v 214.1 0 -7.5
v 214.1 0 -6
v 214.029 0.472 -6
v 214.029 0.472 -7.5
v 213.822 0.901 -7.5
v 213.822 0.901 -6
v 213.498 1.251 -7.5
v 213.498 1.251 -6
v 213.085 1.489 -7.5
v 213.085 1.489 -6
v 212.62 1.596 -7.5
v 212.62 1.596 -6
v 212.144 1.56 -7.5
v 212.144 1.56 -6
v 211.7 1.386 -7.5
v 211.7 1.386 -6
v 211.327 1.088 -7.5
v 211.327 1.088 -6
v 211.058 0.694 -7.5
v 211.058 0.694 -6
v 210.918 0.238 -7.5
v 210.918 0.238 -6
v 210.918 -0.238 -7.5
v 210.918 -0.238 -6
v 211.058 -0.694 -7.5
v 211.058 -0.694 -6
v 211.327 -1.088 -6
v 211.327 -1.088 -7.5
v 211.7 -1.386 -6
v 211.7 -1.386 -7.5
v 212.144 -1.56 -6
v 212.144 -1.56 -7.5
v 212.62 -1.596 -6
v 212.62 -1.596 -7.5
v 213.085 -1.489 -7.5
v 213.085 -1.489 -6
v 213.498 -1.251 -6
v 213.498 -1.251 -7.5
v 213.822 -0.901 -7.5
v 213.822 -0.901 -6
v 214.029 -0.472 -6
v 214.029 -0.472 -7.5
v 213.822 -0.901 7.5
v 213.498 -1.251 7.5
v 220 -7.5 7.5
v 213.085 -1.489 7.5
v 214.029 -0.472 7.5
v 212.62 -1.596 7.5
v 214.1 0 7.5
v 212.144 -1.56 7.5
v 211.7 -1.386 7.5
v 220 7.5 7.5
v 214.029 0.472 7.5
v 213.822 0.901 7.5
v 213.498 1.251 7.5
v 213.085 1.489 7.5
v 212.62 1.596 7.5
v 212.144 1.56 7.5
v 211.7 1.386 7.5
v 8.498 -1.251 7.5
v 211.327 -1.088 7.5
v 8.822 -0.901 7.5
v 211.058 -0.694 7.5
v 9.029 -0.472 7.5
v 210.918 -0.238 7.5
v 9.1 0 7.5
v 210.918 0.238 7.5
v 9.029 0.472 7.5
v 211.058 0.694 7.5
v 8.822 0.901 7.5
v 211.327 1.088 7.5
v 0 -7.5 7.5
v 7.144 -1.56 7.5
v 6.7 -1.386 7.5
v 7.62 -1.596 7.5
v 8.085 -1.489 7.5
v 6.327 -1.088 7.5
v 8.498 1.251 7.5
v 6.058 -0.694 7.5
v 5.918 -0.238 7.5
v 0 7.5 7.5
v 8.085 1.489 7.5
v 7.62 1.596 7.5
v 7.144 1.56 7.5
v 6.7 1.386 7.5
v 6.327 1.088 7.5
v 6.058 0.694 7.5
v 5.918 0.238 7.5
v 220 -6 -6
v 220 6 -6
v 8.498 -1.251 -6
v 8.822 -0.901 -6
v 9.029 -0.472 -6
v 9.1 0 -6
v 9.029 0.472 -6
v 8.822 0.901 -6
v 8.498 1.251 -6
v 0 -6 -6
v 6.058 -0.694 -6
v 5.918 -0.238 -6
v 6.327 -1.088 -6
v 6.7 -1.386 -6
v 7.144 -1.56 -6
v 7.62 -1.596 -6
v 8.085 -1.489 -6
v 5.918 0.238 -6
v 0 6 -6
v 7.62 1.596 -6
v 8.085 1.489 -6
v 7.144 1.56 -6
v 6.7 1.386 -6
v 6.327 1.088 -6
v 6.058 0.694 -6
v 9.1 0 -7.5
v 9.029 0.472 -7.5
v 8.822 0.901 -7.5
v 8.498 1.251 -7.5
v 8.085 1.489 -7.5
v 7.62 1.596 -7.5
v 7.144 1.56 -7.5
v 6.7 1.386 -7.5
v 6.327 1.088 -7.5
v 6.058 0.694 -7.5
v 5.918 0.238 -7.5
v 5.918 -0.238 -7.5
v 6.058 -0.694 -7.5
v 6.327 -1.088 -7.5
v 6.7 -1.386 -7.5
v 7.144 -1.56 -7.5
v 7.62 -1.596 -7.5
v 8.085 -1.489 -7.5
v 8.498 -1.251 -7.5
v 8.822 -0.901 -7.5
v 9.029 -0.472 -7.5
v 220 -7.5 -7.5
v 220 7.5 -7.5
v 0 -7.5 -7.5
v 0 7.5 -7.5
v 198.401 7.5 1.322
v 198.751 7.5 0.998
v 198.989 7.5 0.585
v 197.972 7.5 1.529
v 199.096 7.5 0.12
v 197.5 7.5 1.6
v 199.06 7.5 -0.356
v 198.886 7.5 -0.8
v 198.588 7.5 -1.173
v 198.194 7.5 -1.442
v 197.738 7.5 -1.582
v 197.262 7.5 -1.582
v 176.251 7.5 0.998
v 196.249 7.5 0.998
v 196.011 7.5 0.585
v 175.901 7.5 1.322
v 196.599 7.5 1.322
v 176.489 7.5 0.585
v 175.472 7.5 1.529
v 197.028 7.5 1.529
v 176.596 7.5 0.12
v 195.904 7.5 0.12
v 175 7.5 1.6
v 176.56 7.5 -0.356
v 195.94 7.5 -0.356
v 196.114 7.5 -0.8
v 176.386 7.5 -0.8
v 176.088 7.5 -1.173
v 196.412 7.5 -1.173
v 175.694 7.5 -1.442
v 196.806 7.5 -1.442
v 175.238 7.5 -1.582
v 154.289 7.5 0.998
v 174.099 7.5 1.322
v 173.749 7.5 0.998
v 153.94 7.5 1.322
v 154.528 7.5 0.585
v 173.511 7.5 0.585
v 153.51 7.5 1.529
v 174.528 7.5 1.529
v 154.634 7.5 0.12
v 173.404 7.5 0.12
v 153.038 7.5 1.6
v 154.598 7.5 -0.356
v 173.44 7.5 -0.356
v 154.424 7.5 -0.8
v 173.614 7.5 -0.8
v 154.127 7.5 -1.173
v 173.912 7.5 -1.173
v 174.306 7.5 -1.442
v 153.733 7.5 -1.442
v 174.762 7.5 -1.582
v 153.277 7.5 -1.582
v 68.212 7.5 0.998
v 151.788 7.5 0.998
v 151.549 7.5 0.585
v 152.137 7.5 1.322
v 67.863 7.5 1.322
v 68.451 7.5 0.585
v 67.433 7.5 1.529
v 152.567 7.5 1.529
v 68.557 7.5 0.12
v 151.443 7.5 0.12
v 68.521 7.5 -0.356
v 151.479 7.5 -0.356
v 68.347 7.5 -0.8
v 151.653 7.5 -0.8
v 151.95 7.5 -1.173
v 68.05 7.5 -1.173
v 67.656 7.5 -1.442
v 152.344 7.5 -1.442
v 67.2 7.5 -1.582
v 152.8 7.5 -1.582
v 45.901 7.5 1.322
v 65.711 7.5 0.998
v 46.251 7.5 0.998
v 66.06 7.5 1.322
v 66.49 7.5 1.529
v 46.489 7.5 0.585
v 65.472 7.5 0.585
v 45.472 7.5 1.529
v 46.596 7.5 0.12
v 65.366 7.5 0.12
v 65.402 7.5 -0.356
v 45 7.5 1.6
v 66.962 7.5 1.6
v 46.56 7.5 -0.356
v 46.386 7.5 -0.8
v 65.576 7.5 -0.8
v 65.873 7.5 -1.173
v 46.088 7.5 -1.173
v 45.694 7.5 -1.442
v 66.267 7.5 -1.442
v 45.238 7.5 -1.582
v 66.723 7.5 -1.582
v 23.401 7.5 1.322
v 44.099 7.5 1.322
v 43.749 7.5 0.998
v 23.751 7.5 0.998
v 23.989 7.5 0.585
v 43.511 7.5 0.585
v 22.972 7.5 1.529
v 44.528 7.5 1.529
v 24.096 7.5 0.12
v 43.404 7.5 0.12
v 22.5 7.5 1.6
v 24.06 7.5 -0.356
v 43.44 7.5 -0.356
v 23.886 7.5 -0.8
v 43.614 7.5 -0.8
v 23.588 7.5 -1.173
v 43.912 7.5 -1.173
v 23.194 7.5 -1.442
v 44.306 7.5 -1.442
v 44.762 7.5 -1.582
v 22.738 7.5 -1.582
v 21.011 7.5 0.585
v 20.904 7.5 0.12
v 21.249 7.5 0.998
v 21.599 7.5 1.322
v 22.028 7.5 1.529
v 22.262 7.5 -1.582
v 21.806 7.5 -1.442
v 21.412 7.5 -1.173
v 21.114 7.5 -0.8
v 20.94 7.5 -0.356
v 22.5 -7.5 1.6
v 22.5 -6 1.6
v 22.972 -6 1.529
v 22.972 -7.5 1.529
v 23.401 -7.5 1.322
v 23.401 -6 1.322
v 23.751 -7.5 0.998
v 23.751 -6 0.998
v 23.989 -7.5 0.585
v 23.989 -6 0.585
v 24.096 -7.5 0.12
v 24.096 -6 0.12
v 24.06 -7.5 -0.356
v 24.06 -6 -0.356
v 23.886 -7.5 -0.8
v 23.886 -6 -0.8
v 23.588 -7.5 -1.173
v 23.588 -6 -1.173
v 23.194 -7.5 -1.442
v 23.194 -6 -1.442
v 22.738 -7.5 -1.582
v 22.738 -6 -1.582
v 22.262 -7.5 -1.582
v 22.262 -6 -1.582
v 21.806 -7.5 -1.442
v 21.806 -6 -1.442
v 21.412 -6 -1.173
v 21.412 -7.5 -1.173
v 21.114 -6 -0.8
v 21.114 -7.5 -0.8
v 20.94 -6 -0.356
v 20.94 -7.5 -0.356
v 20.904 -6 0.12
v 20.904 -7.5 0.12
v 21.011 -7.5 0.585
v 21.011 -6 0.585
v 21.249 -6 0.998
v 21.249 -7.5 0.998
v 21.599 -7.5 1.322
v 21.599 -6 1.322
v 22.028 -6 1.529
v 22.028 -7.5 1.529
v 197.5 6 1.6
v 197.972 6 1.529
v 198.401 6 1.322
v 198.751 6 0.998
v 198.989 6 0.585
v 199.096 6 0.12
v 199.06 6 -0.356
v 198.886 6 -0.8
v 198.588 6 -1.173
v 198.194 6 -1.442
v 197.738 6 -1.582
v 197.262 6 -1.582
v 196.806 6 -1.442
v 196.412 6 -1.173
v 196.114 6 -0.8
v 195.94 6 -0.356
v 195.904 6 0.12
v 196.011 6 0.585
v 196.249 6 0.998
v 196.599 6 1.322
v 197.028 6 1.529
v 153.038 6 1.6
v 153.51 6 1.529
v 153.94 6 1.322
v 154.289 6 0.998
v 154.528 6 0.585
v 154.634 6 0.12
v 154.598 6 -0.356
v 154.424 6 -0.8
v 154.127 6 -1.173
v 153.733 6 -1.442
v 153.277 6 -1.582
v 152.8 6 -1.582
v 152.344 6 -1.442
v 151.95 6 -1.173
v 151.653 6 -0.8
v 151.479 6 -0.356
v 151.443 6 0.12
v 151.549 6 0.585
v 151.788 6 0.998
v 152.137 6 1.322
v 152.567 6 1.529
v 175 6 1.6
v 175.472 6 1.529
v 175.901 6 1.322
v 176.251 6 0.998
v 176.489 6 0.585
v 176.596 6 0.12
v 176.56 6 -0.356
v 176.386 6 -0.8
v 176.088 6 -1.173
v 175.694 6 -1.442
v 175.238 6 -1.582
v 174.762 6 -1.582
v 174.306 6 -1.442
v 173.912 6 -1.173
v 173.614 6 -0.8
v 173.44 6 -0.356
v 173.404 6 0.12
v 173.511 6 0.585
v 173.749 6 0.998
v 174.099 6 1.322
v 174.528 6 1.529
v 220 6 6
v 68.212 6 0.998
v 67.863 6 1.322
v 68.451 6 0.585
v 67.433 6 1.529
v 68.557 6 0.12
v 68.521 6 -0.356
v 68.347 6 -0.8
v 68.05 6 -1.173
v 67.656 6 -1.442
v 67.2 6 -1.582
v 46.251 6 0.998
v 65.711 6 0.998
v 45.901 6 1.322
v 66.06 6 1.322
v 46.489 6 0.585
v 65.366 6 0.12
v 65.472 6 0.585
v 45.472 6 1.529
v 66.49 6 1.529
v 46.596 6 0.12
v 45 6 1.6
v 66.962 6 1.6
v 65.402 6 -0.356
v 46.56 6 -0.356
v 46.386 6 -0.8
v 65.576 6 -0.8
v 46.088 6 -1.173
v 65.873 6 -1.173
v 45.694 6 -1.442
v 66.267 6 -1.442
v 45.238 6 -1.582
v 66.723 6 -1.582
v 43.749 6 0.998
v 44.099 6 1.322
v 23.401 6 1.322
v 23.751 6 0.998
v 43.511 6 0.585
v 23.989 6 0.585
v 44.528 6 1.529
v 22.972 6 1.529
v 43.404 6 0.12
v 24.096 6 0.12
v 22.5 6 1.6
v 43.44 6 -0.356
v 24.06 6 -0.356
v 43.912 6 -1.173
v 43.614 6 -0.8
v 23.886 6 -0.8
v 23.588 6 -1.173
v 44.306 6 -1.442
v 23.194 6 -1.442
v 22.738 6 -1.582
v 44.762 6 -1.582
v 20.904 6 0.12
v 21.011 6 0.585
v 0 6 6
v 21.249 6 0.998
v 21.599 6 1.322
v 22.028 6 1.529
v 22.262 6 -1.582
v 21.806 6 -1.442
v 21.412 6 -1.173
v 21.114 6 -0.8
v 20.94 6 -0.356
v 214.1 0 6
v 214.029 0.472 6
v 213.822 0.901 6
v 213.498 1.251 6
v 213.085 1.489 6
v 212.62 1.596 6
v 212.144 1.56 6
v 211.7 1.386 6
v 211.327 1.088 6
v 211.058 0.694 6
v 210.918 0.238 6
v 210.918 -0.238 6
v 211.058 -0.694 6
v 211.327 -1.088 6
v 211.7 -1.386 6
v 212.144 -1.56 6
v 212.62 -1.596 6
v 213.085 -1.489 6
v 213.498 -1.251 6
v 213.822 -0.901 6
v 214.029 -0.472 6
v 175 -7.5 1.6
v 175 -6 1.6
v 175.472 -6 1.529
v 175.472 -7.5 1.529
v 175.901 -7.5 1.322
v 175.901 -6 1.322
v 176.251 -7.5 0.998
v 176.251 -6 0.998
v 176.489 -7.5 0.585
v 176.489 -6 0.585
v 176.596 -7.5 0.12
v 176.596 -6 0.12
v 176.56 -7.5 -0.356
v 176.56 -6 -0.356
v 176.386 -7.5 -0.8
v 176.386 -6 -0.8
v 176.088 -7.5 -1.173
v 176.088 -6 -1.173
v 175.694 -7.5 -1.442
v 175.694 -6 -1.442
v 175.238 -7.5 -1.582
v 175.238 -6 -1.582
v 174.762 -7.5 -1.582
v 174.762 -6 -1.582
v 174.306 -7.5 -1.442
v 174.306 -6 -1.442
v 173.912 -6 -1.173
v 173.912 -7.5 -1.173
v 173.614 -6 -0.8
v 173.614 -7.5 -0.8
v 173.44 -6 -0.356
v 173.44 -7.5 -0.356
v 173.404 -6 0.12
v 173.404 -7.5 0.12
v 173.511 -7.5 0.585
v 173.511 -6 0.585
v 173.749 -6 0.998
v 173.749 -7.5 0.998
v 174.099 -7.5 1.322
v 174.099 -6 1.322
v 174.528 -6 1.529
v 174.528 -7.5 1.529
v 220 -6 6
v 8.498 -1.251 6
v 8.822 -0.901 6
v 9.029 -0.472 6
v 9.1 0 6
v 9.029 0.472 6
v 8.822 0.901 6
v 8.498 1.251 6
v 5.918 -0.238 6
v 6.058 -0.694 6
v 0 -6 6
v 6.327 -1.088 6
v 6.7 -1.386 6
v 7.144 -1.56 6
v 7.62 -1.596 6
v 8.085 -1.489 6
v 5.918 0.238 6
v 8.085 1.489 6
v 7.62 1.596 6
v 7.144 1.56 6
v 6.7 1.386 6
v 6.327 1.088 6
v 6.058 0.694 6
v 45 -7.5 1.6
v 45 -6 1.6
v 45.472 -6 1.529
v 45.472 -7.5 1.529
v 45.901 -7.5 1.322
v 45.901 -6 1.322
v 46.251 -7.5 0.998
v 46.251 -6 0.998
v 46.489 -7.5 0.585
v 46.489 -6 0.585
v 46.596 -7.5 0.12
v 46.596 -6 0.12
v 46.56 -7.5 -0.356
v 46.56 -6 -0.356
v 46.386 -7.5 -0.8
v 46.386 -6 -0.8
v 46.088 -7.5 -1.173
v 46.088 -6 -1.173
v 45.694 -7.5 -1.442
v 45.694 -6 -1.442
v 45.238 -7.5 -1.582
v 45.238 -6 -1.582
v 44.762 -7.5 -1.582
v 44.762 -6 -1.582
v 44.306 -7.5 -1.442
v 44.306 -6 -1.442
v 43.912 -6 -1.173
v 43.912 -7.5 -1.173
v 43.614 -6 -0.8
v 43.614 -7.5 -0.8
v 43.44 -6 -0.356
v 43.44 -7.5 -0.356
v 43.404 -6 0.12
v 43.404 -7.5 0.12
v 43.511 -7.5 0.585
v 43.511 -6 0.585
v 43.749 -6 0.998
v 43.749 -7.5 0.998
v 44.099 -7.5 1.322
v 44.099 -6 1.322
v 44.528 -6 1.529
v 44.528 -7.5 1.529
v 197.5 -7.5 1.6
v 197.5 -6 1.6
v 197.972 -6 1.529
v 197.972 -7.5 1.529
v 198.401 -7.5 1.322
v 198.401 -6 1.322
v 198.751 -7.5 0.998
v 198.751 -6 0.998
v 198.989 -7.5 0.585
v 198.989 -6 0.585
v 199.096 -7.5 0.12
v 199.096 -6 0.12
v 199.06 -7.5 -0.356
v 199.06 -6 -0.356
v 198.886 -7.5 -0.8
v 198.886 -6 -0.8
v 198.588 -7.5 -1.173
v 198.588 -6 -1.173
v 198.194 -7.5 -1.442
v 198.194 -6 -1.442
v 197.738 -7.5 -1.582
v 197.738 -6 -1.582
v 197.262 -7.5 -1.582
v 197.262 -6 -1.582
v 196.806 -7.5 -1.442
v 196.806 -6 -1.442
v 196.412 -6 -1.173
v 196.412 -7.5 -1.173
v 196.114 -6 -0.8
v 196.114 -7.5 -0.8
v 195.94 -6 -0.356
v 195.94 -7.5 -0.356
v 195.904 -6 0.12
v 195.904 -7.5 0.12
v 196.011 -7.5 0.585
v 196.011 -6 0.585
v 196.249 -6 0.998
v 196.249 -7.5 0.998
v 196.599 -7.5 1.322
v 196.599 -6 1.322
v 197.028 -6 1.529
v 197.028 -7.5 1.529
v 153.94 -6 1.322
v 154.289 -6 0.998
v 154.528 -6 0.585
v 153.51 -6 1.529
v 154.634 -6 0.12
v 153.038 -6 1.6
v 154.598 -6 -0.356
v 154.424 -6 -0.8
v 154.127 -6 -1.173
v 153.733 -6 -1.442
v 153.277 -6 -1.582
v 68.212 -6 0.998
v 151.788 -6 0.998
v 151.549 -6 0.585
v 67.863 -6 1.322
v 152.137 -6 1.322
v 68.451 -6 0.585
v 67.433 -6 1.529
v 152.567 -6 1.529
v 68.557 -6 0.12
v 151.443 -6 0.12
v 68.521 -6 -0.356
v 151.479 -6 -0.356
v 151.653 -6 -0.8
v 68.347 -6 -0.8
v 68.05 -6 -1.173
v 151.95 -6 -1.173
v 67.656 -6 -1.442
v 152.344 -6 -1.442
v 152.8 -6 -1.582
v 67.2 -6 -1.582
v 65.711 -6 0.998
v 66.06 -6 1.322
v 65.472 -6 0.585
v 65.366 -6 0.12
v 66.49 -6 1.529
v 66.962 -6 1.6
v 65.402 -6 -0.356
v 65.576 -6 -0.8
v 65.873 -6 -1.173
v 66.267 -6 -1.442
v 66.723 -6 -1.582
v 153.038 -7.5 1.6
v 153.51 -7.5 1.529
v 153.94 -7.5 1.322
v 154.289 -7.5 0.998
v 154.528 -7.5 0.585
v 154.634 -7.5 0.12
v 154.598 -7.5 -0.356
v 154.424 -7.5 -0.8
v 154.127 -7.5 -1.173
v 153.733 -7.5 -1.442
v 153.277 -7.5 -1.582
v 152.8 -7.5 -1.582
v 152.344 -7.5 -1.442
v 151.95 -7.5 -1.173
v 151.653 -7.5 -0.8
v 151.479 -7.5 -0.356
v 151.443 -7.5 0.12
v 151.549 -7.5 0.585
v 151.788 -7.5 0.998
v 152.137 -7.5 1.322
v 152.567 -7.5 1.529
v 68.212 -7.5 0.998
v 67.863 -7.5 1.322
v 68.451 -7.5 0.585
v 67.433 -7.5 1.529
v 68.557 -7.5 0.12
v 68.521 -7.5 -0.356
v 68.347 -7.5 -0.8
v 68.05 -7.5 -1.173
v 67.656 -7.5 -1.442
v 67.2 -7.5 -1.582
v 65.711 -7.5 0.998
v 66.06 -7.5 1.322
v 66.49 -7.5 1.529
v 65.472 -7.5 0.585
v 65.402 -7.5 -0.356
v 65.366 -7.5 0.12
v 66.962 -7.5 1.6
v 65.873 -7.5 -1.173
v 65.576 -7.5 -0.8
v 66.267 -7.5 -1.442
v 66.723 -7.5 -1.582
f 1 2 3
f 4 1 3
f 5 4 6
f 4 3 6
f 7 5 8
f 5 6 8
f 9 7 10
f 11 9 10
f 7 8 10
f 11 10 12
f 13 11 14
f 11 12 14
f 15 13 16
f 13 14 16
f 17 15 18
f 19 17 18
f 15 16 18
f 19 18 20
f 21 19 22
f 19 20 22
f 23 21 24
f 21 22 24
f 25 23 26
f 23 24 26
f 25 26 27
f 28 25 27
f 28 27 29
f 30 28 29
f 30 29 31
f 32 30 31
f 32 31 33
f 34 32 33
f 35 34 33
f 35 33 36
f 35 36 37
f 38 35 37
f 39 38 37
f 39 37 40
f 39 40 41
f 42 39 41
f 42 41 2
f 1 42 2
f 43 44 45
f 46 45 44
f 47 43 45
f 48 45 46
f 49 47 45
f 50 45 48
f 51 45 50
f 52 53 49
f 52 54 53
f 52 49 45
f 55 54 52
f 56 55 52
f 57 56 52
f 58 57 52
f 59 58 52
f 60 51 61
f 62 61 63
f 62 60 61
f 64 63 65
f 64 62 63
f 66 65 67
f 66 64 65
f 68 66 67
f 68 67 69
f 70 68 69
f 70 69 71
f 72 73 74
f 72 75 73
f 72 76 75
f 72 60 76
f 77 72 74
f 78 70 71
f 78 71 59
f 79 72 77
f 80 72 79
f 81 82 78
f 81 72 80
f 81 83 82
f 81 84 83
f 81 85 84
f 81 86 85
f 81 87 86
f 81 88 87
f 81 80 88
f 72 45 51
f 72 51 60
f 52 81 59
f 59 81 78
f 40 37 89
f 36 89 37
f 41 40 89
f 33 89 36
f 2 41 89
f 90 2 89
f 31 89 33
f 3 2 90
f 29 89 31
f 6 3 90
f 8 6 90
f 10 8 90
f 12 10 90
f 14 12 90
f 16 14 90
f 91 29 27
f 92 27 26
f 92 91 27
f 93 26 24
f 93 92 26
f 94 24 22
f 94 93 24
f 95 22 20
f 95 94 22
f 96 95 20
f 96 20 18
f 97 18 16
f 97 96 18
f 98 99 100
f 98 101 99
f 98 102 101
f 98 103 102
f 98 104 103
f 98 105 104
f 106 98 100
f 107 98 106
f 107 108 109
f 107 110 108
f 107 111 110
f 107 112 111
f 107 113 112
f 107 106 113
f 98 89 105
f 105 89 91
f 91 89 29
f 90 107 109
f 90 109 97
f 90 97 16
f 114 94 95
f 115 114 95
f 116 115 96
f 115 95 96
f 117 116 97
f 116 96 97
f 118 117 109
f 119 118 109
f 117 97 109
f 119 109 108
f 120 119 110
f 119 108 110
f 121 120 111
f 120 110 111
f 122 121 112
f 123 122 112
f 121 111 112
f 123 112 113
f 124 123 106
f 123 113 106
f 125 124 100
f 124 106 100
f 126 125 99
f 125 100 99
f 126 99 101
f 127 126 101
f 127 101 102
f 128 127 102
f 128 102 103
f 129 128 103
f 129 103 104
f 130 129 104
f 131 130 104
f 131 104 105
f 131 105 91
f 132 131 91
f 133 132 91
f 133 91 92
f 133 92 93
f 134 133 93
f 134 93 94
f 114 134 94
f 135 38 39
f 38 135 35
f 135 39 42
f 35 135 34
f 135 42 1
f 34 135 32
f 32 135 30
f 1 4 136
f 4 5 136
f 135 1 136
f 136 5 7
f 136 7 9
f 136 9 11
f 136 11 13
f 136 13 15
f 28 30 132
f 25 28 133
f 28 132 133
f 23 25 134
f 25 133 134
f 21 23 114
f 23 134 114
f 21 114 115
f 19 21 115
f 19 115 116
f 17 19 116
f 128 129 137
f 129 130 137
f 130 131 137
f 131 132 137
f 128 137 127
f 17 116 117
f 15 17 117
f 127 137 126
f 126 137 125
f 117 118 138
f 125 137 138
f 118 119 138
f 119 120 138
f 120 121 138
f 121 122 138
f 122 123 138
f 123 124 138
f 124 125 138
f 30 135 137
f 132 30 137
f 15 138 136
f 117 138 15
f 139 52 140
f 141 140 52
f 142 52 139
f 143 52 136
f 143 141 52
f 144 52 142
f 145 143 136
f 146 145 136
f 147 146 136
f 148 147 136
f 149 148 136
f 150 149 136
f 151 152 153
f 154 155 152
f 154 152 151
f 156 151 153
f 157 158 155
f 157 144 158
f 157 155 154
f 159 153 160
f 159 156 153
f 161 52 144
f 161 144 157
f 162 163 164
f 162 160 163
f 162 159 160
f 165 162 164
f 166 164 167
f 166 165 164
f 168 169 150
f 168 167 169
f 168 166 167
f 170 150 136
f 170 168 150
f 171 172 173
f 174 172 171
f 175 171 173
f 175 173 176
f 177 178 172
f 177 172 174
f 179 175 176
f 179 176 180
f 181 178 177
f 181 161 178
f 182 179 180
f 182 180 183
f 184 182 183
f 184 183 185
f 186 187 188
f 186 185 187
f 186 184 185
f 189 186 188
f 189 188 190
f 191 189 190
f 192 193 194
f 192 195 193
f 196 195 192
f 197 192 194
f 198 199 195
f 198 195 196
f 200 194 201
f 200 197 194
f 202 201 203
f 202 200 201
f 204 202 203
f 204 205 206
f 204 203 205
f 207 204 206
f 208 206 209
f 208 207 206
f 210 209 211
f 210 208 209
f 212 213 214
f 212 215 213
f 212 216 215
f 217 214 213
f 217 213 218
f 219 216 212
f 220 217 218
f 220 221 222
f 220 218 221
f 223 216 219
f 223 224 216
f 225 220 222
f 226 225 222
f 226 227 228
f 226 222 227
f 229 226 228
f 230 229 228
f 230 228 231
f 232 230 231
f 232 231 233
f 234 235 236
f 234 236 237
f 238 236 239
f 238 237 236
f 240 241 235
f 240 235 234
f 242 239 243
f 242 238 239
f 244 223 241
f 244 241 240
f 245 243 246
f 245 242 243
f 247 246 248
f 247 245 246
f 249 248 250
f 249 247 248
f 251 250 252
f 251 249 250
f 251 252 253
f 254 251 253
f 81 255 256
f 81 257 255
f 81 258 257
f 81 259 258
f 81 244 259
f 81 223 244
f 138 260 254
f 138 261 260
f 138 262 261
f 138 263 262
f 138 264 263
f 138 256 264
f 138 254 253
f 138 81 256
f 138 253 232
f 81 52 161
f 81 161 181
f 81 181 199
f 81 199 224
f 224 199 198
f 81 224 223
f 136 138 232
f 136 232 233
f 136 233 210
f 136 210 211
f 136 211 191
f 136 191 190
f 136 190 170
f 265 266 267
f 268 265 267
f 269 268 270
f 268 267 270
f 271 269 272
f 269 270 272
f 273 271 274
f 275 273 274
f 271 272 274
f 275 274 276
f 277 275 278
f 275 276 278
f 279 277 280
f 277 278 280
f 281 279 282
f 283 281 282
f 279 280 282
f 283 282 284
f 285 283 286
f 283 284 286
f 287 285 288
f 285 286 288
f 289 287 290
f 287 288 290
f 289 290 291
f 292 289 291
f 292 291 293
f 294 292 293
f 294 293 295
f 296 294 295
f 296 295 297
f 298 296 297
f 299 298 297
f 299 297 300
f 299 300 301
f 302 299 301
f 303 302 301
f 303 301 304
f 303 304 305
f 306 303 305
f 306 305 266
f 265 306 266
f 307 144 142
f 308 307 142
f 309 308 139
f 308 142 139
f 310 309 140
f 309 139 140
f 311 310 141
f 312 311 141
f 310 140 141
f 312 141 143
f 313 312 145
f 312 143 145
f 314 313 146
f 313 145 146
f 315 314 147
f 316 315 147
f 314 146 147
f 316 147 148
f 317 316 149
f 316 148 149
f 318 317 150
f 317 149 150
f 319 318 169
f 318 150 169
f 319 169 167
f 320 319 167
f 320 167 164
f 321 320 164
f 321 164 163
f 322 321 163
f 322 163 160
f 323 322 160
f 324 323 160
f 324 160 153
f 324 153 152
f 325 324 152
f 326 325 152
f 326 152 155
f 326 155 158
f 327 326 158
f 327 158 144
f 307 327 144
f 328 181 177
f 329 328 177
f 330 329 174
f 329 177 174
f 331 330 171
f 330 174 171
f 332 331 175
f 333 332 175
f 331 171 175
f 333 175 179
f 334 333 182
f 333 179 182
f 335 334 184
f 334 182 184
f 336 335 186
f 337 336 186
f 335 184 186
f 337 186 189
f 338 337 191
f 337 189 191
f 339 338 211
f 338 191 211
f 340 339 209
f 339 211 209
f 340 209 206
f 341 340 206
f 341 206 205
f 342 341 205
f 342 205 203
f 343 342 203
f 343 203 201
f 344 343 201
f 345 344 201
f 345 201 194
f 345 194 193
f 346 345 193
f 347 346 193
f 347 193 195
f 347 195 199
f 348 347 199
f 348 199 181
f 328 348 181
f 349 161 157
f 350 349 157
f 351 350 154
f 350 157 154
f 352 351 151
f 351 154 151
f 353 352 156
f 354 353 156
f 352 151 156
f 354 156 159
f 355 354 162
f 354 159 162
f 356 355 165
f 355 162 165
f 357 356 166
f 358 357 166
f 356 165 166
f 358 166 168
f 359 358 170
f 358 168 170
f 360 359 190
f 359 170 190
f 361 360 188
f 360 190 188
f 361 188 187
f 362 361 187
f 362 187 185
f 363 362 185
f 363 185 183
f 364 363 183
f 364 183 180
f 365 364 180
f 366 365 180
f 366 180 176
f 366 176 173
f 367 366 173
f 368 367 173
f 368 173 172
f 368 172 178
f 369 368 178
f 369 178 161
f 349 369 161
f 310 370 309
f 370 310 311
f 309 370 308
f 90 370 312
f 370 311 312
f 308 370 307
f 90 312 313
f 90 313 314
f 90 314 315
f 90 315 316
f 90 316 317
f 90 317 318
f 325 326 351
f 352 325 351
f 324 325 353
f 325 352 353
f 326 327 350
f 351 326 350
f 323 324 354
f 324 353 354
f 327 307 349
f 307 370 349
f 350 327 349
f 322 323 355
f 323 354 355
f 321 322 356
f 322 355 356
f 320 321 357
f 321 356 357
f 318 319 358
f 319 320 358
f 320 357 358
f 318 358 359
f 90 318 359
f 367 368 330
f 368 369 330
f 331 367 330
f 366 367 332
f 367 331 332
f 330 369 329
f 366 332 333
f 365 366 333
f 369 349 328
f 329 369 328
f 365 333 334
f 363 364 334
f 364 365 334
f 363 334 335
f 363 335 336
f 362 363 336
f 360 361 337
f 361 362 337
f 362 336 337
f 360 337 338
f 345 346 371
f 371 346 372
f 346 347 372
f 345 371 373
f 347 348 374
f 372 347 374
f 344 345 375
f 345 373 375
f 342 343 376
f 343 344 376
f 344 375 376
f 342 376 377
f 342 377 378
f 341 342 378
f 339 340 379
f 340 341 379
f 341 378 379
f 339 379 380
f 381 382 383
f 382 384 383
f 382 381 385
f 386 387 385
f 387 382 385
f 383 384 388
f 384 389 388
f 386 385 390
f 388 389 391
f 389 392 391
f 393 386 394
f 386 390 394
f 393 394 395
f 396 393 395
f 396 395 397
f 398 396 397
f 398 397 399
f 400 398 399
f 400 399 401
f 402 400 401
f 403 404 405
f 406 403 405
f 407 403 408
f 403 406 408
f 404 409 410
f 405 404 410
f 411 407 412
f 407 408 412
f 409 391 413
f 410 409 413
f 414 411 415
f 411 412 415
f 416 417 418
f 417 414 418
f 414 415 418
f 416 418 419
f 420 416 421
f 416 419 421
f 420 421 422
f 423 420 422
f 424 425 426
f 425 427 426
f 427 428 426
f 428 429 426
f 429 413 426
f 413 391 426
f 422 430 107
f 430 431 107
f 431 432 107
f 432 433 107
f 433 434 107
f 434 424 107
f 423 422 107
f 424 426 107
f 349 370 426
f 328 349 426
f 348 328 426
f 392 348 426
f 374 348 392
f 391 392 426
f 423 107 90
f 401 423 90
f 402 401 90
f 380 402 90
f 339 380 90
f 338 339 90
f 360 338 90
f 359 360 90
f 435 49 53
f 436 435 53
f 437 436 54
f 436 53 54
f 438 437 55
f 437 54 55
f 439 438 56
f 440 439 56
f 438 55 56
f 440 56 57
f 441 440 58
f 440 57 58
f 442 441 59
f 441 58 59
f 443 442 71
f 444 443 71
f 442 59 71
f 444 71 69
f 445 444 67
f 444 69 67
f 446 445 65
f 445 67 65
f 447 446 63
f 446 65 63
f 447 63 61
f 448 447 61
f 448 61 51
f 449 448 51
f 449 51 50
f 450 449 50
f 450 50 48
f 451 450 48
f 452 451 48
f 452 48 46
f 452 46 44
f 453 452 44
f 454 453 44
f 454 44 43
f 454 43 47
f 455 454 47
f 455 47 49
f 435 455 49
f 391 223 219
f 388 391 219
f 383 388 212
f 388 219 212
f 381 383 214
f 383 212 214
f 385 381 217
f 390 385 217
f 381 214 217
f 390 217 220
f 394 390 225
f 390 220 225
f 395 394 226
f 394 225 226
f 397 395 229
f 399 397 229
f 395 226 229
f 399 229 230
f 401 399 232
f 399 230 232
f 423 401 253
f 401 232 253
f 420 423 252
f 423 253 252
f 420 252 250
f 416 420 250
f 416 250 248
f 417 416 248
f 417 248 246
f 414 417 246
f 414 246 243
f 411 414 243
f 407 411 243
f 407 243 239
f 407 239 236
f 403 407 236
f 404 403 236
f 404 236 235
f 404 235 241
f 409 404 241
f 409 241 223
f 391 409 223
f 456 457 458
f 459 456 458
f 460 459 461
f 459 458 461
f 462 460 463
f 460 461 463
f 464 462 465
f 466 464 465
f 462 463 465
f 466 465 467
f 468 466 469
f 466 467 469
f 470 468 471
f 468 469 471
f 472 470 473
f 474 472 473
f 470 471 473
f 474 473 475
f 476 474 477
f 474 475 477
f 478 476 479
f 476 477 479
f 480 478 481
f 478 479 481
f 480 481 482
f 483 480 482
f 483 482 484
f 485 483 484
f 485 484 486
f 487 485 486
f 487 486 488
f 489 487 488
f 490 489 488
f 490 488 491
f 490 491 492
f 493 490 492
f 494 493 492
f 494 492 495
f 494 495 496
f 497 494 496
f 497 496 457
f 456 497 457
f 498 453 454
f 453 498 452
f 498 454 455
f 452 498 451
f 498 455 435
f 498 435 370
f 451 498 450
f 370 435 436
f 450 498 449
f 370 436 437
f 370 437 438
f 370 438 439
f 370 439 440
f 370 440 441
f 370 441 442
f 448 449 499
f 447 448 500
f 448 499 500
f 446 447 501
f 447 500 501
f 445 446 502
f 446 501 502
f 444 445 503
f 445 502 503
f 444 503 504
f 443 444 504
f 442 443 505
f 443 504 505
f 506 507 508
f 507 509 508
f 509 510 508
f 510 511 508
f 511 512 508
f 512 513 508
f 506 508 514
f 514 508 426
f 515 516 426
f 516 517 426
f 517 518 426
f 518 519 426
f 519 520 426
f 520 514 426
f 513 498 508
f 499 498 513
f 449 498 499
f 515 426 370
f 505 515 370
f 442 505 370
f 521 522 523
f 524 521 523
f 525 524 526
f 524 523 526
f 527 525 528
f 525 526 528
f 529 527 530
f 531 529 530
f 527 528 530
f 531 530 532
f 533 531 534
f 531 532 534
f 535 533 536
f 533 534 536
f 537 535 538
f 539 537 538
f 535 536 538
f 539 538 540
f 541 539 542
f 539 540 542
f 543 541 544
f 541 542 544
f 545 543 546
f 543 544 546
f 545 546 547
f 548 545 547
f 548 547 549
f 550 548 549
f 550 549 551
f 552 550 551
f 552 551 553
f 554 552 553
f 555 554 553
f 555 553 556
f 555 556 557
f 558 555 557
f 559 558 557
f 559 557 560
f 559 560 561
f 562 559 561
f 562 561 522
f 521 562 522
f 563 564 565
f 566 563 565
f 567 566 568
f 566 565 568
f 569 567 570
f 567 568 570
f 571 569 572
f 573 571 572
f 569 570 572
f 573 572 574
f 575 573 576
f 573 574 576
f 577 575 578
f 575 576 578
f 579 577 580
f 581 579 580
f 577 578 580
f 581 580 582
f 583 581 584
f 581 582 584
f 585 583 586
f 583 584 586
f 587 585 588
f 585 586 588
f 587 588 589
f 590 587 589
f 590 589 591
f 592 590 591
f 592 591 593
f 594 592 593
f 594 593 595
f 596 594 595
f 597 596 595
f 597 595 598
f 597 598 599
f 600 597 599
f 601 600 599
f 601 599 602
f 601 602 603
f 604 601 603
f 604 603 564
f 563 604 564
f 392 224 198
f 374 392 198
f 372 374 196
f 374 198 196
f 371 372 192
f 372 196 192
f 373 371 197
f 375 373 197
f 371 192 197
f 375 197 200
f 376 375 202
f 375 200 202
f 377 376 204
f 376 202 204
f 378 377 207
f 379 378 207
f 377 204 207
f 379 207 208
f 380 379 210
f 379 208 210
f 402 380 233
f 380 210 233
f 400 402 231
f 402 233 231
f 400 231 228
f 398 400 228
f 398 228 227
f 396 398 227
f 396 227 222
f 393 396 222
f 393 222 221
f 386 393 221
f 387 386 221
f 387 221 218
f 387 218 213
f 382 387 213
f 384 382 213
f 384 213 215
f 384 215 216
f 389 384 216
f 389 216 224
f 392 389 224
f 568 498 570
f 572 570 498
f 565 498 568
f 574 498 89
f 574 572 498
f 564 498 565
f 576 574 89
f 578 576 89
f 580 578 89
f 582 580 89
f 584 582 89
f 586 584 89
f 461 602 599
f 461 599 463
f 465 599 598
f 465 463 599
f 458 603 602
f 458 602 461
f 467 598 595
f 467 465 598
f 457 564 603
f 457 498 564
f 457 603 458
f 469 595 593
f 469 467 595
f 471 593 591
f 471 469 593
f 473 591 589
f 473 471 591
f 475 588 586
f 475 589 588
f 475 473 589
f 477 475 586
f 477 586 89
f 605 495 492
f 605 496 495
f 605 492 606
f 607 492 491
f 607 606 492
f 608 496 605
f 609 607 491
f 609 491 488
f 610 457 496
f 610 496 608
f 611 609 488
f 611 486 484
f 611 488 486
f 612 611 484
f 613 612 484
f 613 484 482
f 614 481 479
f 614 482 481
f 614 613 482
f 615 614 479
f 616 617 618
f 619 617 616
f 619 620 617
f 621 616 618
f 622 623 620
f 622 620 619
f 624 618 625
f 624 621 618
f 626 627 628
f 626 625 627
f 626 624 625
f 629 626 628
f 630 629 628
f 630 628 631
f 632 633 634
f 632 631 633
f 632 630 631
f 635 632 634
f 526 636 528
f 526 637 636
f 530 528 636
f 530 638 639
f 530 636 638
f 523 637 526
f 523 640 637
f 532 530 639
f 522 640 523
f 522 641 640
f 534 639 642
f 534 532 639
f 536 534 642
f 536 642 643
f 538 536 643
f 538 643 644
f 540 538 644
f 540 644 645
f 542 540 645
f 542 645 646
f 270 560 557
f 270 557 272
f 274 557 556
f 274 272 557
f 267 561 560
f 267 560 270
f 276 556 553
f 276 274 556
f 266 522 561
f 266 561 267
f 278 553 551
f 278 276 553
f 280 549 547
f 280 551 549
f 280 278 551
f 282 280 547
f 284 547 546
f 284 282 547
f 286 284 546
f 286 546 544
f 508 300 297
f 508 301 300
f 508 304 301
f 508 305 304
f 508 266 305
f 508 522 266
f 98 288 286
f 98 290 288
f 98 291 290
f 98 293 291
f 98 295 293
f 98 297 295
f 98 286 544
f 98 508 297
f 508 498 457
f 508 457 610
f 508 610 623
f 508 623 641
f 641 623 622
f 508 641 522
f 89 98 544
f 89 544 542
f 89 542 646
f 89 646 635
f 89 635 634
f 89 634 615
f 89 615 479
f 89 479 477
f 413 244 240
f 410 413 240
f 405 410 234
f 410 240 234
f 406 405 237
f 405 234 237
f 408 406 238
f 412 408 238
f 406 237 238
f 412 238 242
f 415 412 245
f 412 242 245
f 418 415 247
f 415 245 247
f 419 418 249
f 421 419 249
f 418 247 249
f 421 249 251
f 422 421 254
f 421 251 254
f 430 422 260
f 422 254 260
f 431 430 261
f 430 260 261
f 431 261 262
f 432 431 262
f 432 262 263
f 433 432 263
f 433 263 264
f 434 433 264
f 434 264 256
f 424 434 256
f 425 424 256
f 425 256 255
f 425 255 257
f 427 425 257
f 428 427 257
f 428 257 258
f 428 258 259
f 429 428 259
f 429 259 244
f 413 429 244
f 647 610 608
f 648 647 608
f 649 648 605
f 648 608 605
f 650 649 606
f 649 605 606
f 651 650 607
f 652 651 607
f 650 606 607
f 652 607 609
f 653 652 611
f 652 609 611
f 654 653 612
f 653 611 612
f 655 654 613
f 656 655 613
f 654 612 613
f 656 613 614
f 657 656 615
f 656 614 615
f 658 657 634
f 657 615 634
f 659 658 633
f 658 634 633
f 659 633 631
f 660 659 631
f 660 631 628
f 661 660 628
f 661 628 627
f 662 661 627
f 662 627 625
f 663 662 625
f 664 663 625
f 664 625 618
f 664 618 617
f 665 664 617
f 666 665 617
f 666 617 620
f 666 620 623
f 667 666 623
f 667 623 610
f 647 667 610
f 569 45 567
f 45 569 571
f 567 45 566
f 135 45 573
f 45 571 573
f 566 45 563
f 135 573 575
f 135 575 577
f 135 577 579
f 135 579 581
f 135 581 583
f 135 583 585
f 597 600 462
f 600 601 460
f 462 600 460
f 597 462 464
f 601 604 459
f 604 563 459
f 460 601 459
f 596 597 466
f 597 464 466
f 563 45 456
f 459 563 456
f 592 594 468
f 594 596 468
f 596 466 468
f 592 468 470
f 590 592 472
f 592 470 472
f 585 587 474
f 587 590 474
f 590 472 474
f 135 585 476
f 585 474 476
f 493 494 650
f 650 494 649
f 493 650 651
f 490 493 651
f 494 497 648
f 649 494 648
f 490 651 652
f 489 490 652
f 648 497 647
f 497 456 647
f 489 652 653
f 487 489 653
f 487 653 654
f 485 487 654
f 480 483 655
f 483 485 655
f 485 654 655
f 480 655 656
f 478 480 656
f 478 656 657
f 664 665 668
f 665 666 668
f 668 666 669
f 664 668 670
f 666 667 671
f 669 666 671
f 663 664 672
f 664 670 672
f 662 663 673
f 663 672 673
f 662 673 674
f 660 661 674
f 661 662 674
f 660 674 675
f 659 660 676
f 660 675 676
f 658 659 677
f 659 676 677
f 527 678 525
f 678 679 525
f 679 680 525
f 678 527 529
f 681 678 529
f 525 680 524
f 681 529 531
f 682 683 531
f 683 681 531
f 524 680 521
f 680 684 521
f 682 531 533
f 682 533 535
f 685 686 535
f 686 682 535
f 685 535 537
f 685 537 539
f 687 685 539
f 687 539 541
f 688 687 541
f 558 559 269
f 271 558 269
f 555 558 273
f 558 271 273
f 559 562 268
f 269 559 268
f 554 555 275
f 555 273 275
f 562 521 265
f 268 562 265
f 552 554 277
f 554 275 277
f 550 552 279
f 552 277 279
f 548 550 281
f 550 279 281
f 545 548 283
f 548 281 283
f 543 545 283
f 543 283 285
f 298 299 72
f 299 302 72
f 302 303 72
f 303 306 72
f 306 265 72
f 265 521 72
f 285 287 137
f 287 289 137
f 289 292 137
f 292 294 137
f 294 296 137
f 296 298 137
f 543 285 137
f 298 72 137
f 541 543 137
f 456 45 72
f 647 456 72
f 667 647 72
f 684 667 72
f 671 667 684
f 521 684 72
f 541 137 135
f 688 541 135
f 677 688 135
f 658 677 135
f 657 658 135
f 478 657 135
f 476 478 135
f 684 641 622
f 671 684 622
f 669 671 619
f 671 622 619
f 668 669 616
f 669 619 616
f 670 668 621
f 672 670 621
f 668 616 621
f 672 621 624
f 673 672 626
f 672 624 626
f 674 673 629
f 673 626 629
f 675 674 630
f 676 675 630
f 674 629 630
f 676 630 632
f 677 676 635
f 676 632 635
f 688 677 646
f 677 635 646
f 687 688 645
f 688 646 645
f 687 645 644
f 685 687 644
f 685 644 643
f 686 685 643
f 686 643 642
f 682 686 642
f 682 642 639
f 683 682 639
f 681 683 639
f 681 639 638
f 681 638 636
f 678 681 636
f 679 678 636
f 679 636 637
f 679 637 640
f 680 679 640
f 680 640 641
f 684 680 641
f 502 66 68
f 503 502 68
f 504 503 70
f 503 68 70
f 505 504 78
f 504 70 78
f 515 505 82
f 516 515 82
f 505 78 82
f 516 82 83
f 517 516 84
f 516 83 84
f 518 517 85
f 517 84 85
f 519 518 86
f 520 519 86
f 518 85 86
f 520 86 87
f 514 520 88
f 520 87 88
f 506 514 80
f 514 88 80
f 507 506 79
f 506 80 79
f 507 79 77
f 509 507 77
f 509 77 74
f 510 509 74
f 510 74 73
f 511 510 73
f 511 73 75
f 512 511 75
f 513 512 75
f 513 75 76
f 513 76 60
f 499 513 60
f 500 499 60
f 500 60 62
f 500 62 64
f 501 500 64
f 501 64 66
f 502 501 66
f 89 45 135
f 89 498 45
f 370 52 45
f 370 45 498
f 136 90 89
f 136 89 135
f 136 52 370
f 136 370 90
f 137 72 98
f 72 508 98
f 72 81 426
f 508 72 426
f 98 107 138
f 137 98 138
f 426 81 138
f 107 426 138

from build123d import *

# Parameters (mm, degrees)
SKETCH_1_W          = 15
SKETCH_1_H          = 15
SKETCH_1_W_2        = 12
SKETCH_1_H_2        = 12
EXTRUDE_1_DEPTH     = 220
SKETCH_2_R          = 1.6
CUT_EXTRUDE_1_DEPTH = 221.638278637
SKETCH_3_R          = 1.6
CUT_EXTRUDE_2_DEPTH = 221.638278637


with BuildPart() as part:
    # ｽｹｯﾁ1 → ﾎﾞｽ - 押し出し1 (new body)
    with BuildSketch(Plane(origin=(0, 0, 0), x_dir=(0, 0, -1), z_dir=(1, 0, 0))):
        Rectangle(SKETCH_1_W, SKETCH_1_H)
        Rectangle(SKETCH_1_W_2, SKETCH_1_H_2, mode=Mode.SUBTRACT)
    extrude(amount=EXTRUDE_1_DEPTH)

    # ｽｹｯﾁ2 → ｶｯﾄ - 押し出し1 (cut, through all)
    with BuildSketch(Plane(origin=(0, 7.5, 0), x_dir=(1, 0, 0), z_dir=(0, 1, 0))):
        with Locations(Location((66.961524227, 0, 0), (0, 0, 270))):
            Circle(SKETCH_2_R)
        with Locations(Location((45, 0, 0), (0, 0, 270))):
            Circle(SKETCH_2_R)
        with Locations(Location((175, 0, 0), (0, 0, 270))):
            Circle(SKETCH_2_R)
        with Locations(Location((153.038475773, 0, 0), (0, 0, 270))):
            Circle(SKETCH_2_R)
        with Locations(Location((22.5, 0, 0), (0, 0, 270))):
            Circle(SKETCH_2_R)
        with Locations(Location((197.5, 0, 0), (0, 0, 270))):
            Circle(SKETCH_2_R)
    extrude(amount=-CUT_EXTRUDE_1_DEPTH, mode=Mode.SUBTRACT)

    # ｽｹｯﾁ3 → ｶｯﾄ - 押し出し2 (cut, through all)
    with BuildSketch(Plane.XY.offset(7.5)):
        with Locations((7.5, 0)):
            Circle(SKETCH_3_R)
        with Locations((212.5, 0)):
            Circle(SKETCH_3_R)
    extrude(amount=-CUT_EXTRUDE_2_DEPTH, mode=Mode.SUBTRACT)


solid = part.part
